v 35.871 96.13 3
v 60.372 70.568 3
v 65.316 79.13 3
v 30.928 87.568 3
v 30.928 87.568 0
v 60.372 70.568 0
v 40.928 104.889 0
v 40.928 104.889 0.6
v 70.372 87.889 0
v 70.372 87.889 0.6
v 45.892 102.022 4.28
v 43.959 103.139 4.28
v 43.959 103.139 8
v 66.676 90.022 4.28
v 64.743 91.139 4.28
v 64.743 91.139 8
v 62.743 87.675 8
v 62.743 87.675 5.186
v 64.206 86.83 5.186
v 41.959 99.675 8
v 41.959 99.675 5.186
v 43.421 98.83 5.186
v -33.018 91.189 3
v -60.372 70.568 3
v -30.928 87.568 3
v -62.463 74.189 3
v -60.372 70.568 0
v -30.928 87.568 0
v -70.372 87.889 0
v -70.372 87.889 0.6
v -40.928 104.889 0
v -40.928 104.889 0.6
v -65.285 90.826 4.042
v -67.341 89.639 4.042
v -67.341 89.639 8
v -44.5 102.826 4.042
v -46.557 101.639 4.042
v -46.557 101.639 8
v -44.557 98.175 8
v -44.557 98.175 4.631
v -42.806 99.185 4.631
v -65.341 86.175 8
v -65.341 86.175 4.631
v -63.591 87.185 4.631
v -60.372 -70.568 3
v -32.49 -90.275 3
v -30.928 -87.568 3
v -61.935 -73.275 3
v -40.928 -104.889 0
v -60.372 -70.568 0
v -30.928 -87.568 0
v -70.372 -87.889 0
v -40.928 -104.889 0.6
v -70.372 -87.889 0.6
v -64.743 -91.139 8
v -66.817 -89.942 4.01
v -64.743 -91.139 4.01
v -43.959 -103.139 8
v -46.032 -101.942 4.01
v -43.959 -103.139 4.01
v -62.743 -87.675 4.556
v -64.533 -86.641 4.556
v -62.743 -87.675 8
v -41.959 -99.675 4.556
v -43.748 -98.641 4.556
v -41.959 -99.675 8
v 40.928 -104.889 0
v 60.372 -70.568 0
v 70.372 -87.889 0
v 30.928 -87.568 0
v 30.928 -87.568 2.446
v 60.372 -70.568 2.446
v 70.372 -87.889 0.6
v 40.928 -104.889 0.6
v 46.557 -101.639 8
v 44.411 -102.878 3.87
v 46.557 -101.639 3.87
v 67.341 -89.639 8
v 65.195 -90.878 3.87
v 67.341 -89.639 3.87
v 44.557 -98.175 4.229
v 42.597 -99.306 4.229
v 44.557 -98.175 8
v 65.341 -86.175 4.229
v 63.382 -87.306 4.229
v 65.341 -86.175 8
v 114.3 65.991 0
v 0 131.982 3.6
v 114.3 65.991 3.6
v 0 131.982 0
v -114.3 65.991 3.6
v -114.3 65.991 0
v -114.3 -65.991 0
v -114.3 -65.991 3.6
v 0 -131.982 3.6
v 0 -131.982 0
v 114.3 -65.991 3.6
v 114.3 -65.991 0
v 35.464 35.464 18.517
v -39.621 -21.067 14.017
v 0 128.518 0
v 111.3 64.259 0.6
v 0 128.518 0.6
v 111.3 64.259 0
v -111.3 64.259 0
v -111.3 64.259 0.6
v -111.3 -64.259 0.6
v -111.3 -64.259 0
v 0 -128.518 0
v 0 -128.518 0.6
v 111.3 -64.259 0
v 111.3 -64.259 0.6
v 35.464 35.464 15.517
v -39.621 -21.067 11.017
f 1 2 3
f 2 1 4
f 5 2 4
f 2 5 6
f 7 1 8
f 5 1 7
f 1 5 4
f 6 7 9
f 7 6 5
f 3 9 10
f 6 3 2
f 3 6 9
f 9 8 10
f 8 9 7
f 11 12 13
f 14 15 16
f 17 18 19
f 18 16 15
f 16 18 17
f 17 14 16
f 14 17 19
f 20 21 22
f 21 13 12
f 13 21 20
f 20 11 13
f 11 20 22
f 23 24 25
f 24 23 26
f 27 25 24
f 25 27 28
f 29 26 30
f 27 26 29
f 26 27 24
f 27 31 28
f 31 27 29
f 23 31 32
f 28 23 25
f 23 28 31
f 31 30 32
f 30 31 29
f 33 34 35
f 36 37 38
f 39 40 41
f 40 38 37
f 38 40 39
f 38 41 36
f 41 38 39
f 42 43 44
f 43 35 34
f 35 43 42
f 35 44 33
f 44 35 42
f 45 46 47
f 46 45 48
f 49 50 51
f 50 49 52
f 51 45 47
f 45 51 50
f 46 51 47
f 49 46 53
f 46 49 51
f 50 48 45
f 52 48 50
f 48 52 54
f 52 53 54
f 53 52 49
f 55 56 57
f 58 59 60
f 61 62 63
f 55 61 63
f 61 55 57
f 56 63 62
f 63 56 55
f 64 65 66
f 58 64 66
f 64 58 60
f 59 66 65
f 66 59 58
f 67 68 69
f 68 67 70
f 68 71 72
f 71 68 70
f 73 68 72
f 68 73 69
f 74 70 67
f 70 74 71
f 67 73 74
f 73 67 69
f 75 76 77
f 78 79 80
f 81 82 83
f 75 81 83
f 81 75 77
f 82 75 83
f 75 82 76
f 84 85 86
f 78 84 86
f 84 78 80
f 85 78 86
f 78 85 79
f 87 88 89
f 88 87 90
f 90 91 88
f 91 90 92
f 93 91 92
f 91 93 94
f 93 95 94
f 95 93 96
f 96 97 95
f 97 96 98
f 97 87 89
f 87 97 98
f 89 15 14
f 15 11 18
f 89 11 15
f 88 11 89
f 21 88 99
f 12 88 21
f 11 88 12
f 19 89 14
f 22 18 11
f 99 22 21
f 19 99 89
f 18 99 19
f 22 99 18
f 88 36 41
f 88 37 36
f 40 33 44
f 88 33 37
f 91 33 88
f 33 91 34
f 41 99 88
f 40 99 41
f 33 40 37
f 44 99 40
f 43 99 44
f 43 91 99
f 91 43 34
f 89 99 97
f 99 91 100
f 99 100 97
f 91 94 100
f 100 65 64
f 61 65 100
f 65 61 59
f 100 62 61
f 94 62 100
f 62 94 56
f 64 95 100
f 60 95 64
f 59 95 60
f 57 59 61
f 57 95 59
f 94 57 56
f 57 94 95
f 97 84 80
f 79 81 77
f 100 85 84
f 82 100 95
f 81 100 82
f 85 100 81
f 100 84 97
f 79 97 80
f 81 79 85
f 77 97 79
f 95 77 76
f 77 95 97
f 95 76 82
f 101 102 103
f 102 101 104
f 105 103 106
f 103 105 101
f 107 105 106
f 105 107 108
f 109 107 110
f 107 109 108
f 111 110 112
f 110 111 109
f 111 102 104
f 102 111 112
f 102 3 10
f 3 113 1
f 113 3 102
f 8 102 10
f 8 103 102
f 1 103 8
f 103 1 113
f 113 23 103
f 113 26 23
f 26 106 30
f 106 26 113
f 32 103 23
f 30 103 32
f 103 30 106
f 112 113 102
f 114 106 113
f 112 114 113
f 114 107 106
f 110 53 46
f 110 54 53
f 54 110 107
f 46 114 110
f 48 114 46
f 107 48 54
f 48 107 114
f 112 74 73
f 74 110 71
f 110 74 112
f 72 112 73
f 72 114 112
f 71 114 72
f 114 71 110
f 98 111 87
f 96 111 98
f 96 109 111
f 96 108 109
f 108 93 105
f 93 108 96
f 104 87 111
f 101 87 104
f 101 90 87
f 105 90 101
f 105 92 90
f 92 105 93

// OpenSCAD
/*
    parametric_faceted_hex_wall_tile_mount_v21_master_thickness.scad
    ------------------------------------------------------------
    Improved asymmetric low-poly hex wall tile.

    Major v21 changes
    -----------------
    1. ONE master thickness control now drives the whole part:
       master_thickness_mm

       It controls:
       - faceted front shell thickness
       - perimeter wall thickness
       - mounting-tab thickness

       Optional multipliers allow advanced tuning without hiding the
       master control.

    2. Thicker shells now work automatically.
       The effective edge height is automatically raised when required
       so shell_thickness_mm is never blocked by a too-small edge height.

    3. Mounting pads cannot protrude outside the hexagon.
       Pads are intersected with a smaller inset hex footprint.

    4. Stronger default mounting geometry.
       - 3.0 mm pad thickness
       - 4.0 mm shell overlap
       - 3.0 mm edge inset
       - optional reinforcing ribs

    5. Open back remains truly open.
       There is no rear floor across the middle.

    Recommended use
    ---------------
    For a 9-inch decorative wall tile printed vertically:

        master_thickness_mm        = 3.0;
        front_shell_multiplier      = 1.0;
        perimeter_multiplier        = 1.0;
        mount_pad_multiplier        = 1.0;
        mount_pad_overlap_mm        = 4.0;
        mount_pad_edge_inset_mm     = 3.0;
        add_mount_ribs              = true;

    Export
    ------
    F6 Render
    File -> Export -> Export as STL
*/


// =============================================================================
// CUSTOMIZER PARAMETERS
// =============================================================================


/* [Tile Size] */

// Which dimension tile_size represents.
size_reference = "flat_to_flat";     // [flat_to_flat, across_corners]

// Units for tile_size.
size_units = "mm";                   // [mm, in]

// Examples:
// 152.4 = 6"
// 203.2 = 8"
// 228.6 = 9"
// 254.0 = 10"
tile_size = 228.6;

// Rotate finished tile around Z.
tile_rotation_deg = 0;


/* [MASTER THICKNESS] */

// MASTER MATERIAL THICKNESS.
//
// THIS is the main control to use if you want the whole printed part
// physically thicker / stronger.
//
// It directly drives:
//   - faceted front shell thickness
//   - perimeter wall thickness
//   - mounting pad thickness
//
// Recommended:
//   1.6 = light
//   2.0 = medium
//   2.5 = strong
//   3.0 = very strong / recommended for a robust wall tile
//   3.5 = heavy duty
//
master_thickness_mm = 3.0;

// Optional multipliers.
//
// Leave these at 1.0 unless you deliberately want one area stronger
// than the master value.
//
// Example:
// perimeter_multiplier = 1.20 makes a 3.0 mm master produce a
// 3.6 mm perimeter.
front_shell_multiplier = 1.0;
perimeter_multiplier   = 1.0;
mount_pad_multiplier   = 1.0;

// Derived thicknesses are calculated later from the master control.


/* [Front Relief] */

// proportional = scales with tile size
// absolute     = exact millimeter heights below
relief_height_mode = "proportional";    // [proportional, absolute]

// Overall relief multiplier.
relief_scale = 1.0;

// Main peak height relative to flat-to-flat size.
peak_height_ratio = 0.081;

// Ridge height relative to peak.
ridge_to_peak_ratio = 0.757;

// Requested outer edge height relative to peak.
//
// IMPORTANT:
// v21 automatically raises edge height if necessary to fit the selected
// front shell thickness. You normally do NOT need to change this anymore.
edge_to_peak_ratio = 0.097;

// Absolute values, used only in absolute mode.
peak_height_mm  = 18.5;
ridge_height_mm = 14.0;
edge_height_mm  = 1.8;

// Minimum empty clearance between the inner roof and Z=0 at the perimeter.
//
// v20 uses:
// effective_edge_height >= front_shell_thickness_mm + edge_clearance_mm
edge_clearance_mm = 0.60;


/* [Facet Layout] */

// Direction of main peak, CCW from +X.
peak_angle_deg = 45;

// Peak distance from center as a fraction of circumradius.
peak_radius_ratio = 0.38;

// Direction of secondary ridge.
ridge_angle_deg = 208;

// Ridge radial position.
ridge_radius_ratio = 0.34;


/* [Wall Mounting] */

// Enable mounting pads.
add_mount_pads = true;

// Width of each pad parallel to the corresponding hex side.
mount_pad_width_mm = 34.0;

// Radial depth of each pad.
mount_pad_depth_mm = 24.0;

// Mounting-tab thickness is now driven by master_thickness_mm.
// Use mount_pad_multiplier above only if the tabs need to be thicker
// or thinner than the rest of the tile.

// How far the pad reaches beneath the inner perimeter shell.
//
// More overlap creates a stronger pad-to-rim union.
mount_pad_overlap_mm = 4.0;

// Pull the ENTIRE usable pad footprint inward from the outside hex edge.
//
// Pads are clipped against this inset hex, so they cannot protrude outside.
mount_pad_edge_inset_mm = 3.0;

// Directions of mounting pads.
mount_pad_angles = [60, 120, 240, 300];


/* [Mount Reinforcement] */

// Add small triangular reinforcing ribs where pads meet the perimeter.
//
// Recommended ON for vertical printing.
add_mount_ribs = true;

// Rib thickness across the pad.
mount_rib_width_mm = 3.0;

// Rib height into the cavity.
mount_rib_height_mm = 5.0;

// Rib radial depth.
mount_rib_depth_mm = 8.0;


/* [Optional Screw Holes] */

add_pad_screw_holes = false;

// 3.5 ~= #6
// 4.5 ~= #8
pad_screw_hole_diameter_mm = 4.5;


/* [Advanced] */

// Polyhedron preview hint.
polyhedron_convexity = 12;

// Cylinder quality for screw holes.
screw_hole_fn = 40;


// =============================================================================
// DERIVED MATERIAL THICKNESSES
// =============================================================================
//
// These are the ACTUAL thicknesses used by the model.
//

front_shell_thickness_mm =
    master_thickness_mm * front_shell_multiplier;

perimeter_wall_thickness_mm =
    master_thickness_mm * perimeter_multiplier;

mount_pad_thickness_mm =
    master_thickness_mm * mount_pad_multiplier;


// =============================================================================
// DERIVED TILE DIMENSIONS
// =============================================================================

_tile_size_mm =
    size_units == "in"
        ? tile_size * 25.4
        : tile_size;

tile_flat_to_flat =
    size_reference == "flat_to_flat"
        ? _tile_size_mm
        : _tile_size_mm * cos(30);

tile_across_corners =
    tile_flat_to_flat / cos(30);

outer_apothem =
    tile_flat_to_flat / 2;

r_outer =
    outer_apothem / cos(30);

inner_apothem =
    outer_apothem - perimeter_wall_thickness_mm;

r_inner =
    inner_apothem / cos(30);

inner_flat_length =
    2 * inner_apothem * tan(30);

hex_side_length =
    2 * r_outer * sin(30);


// =============================================================================
// DERIVED RELIEF HEIGHTS
// =============================================================================

_peak_unscaled =
    relief_height_mode == "proportional"
        ? tile_flat_to_flat * peak_height_ratio
        : peak_height_mm;

_ridge_unscaled =
    relief_height_mode == "proportional"
        ? _peak_unscaled * ridge_to_peak_ratio
        : ridge_height_mm;

_requested_edge_unscaled =
    relief_height_mode == "proportional"
        ? _peak_unscaled * edge_to_peak_ratio
        : edge_height_mm;

peak_height =
    _peak_unscaled * relief_scale;

ridge_height =
    _ridge_unscaled * relief_scale;

requested_edge_height =
    _requested_edge_unscaled * relief_scale;

// AUTO-FIX:
// Guarantee enough vertical room for the chosen front shell thickness.
minimum_edge_height =
    front_shell_thickness_mm + edge_clearance_mm;

edge_height =
    max(
        requested_edge_height,
        minimum_edge_height
    );


// =============================================================================
// DERIVED MOUNTING GEOMETRY
// =============================================================================

// Desired outer edge before clipping.
//
// This allows the pad to overlap the inner wall structurally.
mount_pad_desired_outer_r =
    inner_apothem + mount_pad_overlap_mm;

mount_pad_inner_r =
    mount_pad_desired_outer_r - mount_pad_depth_mm;

mount_pad_center_r =
    mount_pad_desired_outer_r - mount_pad_depth_mm / 2;

// Smaller hex used as a hard clipping boundary.
//
// Any mount geometry outside this boundary is removed automatically.
mount_clip_apothem =
    outer_apothem - mount_pad_edge_inset_mm;

mount_clip_radius =
    mount_clip_apothem / cos(30);


// =============================================================================
// VALIDATION
// =============================================================================

assert(
    tile_flat_to_flat > 0,
    "tile_size must produce a positive tile dimension."
);

assert(
    master_thickness_mm > 0,
    "master_thickness_mm must be greater than zero."
);

assert(
    front_shell_multiplier > 0 &&
    perimeter_multiplier > 0 &&
    mount_pad_multiplier > 0,
    "All thickness multipliers must be greater than zero."
);

assert(
    front_shell_thickness_mm > 0,
    "front_shell_thickness_mm must be greater than zero."
);

assert(
    perimeter_wall_thickness_mm > 0,
    "perimeter_wall_thickness_mm must be greater than zero."
);

assert(
    perimeter_wall_thickness_mm < outer_apothem,
    "perimeter_wall_thickness_mm is too large for this tile."
);

assert(
    inner_apothem > 0,
    "The selected perimeter wall leaves no hollow interior."
);

assert(
    edge_height > front_shell_thickness_mm,
    "Internal error: edge_height must exceed front_shell_thickness_mm."
);

assert(
    ridge_height > edge_height,
    "ridge_height must remain greater than the effective edge height."
);

assert(
    peak_height > ridge_height,
    "peak_height must remain greater than ridge_height."
);

assert(
    peak_radius_ratio > 0 && peak_radius_ratio < 0.90,
    "peak_radius_ratio must be between 0 and 0.90."
);

assert(
    ridge_radius_ratio > 0 && ridge_radius_ratio < 0.90,
    "ridge_radius_ratio must be between 0 and 0.90."
);

assert(
    mount_pad_width_mm > 0,
    "mount_pad_width_mm must be greater than zero."
);

assert(
    mount_pad_depth_mm > 0,
    "mount_pad_depth_mm must be greater than zero."
);

assert(
    mount_pad_thickness_mm > 0,
    "mount_pad_thickness_mm must be greater than zero."
);

assert(
    mount_pad_overlap_mm >= 0,
    "mount_pad_overlap_mm cannot be negative."
);

assert(
    mount_pad_edge_inset_mm >= 0,
    "mount_pad_edge_inset_mm cannot be negative."
);

assert(
    mount_clip_apothem > 0,
    "mount_pad_edge_inset_mm is too large."
);

assert(
    mount_pad_inner_r > 0,
    "mount_pad_depth_mm is too large and reaches/passes the tile center."
);

assert(
    !add_pad_screw_holes ||
    pad_screw_hole_diameter_mm < mount_pad_width_mm * 0.75,
    "pad_screw_hole_diameter_mm is too large for the mounting pad."
);

assert(
    !add_mount_ribs ||
    mount_rib_height_mm > 0,
    "mount_rib_height_mm must be greater than zero."
);


// =============================================================================
// DIAGNOSTIC OUTPUT
// =============================================================================

echo("====================================================");
echo("FACETED HEX WALL TILE v21");
echo("====================================================");

echo(str("flat-to-flat             : ", tile_flat_to_flat, " mm"));
echo(str("across-corners           : ", tile_across_corners, " mm"));
echo(str("hex side length          : ", hex_side_length, " mm"));

echo(str("MASTER thickness         : ", master_thickness_mm, " mm"));
echo(str("actual front shell       : ", front_shell_thickness_mm, " mm"));
echo(str("actual perimeter wall    : ", perimeter_wall_thickness_mm, " mm"));
echo(str("actual mount pad         : ", mount_pad_thickness_mm, " mm"));
echo(str("perimeter wall thickness : ", perimeter_wall_thickness_mm, " mm"));

echo(str("requested edge height    : ", requested_edge_height, " mm"));
echo(str("minimum edge height      : ", minimum_edge_height, " mm"));
echo(str("EFFECTIVE edge height    : ", edge_height, " mm"));

echo(str("ridge height             : ", ridge_height, " mm"));
echo(str("peak height              : ", peak_height, " mm"));

echo(str("mount pad width          : ", mount_pad_width_mm, " mm"));
echo(str("mount pad depth          : ", mount_pad_depth_mm, " mm"));
echo(str("mount pad thickness      : ", mount_pad_thickness_mm, " mm"));
echo(str("mount pad overlap        : ", mount_pad_overlap_mm, " mm"));
echo(str("mount edge inset         : ", mount_pad_edge_inset_mm, " mm"));

echo(str("mount clip apothem       : ", mount_clip_apothem, " mm"));

if (edge_height > requested_edge_height)
    echo(
        str(
            "AUTO EDGE FIX ACTIVE: edge raised from ",
            requested_edge_height,
            " mm to ",
            edge_height,
            " mm so a ",
            front_shell_thickness_mm,
            " mm front shell fits safely."
        )
    );

echo("====================================================");


// =============================================================================
// HELPERS
// =============================================================================

function polar(angle_deg, radius) =
    [
        radius * cos(angle_deg),
        radius * sin(angle_deg)
    ];

function hex_vertex(i, radius) =
    [
        radius * cos(30 + i * 60),
        radius * sin(30 + i * 60)
    ];


// =============================================================================
// FRONT RELIEF CONTROL POINTS
// =============================================================================

P_xy =
    polar(
        peak_angle_deg,
        r_outer * peak_radius_ratio
    );

Q_xy =
    polar(
        ridge_angle_deg,
        r_outer * ridge_radius_ratio
    );


// =============================================================================
// SHELL VERTICES
// =============================================================================

points =
    concat(

        // 0..5 : outer rear perimeter
        [
            for (i = [0 : 5])
                let(p = hex_vertex(i, r_outer))
                [p[0], p[1], 0]
        ],

        // 6..11 : outer front perimeter
        [
            for (i = [0 : 5])
                let(p = hex_vertex(i, r_outer))
                [p[0], p[1], edge_height]
        ],

        // 12..13 : outer peak / ridge
        [
            [P_xy[0], P_xy[1], peak_height],
            [Q_xy[0], Q_xy[1], ridge_height]
        ],

        // 14..19 : inner rear perimeter
        [
            for (i = [0 : 5])
                let(p = hex_vertex(i, r_inner))
                [p[0], p[1], 0]
        ],

        // 20..25 : inner front perimeter
        [
            for (i = [0 : 5])
                let(p = hex_vertex(i, r_inner))
                [p[0], p[1], edge_height - front_shell_thickness_mm]
        ],

        // 26..27 : inner peak / ridge
        [
            [P_xy[0], P_xy[1], peak_height - front_shell_thickness_mm],
            [Q_xy[0], Q_xy[1], ridge_height - front_shell_thickness_mm]
        ]
    );


// =============================================================================
// SHELL FACES
// =============================================================================

outer_roof_faces = [
    [6, 7, 12],
    [7, 8, 12],
    [6, 12, 11],

    [8, 13, 12],
    [11, 12, 13],

    [8, 9, 13],
    [9, 10, 13],
    [10, 11, 13]
];

inner_roof_faces = [
    [26, 21, 20],
    [26, 22, 21],
    [25, 26, 20],

    [26, 27, 22],
    [27, 26, 25],

    [27, 23, 22],
    [27, 24, 23],
    [27, 25, 24]
];

faces =
    concat(

        // Outer vertical perimeter
        [
            for (i = [0 : 5])
                [
                    i,
                    (i + 1) % 6,
                    6 + (i + 1) % 6,
                    6 + i
                ]
        ],

        outer_roof_faces,

        // Inner vertical perimeter
        [
            for (i = [0 : 5])
                [
                    14 + i,
                    20 + i,
                    20 + (i + 1) % 6,
                    14 + (i + 1) % 6
                ]
        ],

        inner_roof_faces,

        // Narrow rear perimeter ring only.
        // Center remains open.
        [
            for (i = [0 : 5])
                [
                    i,
                    14 + i,
                    14 + (i + 1) % 6,
                    (i + 1) % 6
                ]
        ]
    );


// =============================================================================
// TILE SHELL
// =============================================================================

module tile_shell() {
    polyhedron(
        points = points,
        faces = faces,
        convexity = polyhedron_convexity
    );
}


// =============================================================================
// HEX FOOTPRINT USED TO CLIP MOUNTING TABS
// =============================================================================
//
// This is intentionally smaller than the visible outer hexagon.
// Therefore mount pads/ribs cannot stick out past the visible perimeter.
//

module mount_clip_volume(height_mm) {
    linear_extrude(height = height_mm)
        polygon(
            points = [
                for (i = [0 : 5])
                    hex_vertex(i, mount_clip_radius)
            ]
        );
}


// =============================================================================
// RAW MOUNT PAD
// =============================================================================

module raw_mount_pad(angle_deg) {
    rotate([0, 0, angle_deg])
        translate(
            [
                mount_pad_inner_r,
                -mount_pad_width_mm / 2,
                0
            ]
        )
            cube(
                [
                    mount_pad_depth_mm,
                    mount_pad_width_mm,
                    mount_pad_thickness_mm
                ]
            );
}


// =============================================================================
// CLIPPED MOUNT PAD
// =============================================================================

module mount_pad(angle_deg) {
    intersection() {
        raw_mount_pad(angle_deg);

        mount_clip_volume(
            mount_pad_thickness_mm + 0.01
        );
    }
}


// =============================================================================
// OPTIONAL REINFORCING RIBS
// =============================================================================
//
// Two ribs are placed near the left/right sides of each mounting pad.
//
// They rise into the cavity and help resist bending at the pad-to-shell joint.
//

module raw_mount_ribs(angle_deg) {

    rib_center_r =
        mount_pad_desired_outer_r
        - mount_rib_depth_mm / 2;

    rib_side_offset =
        max(
            0,
            mount_pad_width_mm / 2
            - mount_rib_width_mm
            - 2
        );

    rotate([0, 0, angle_deg]) {

        for (side = [-1, 1]) {

            translate(
                [
                    rib_center_r - mount_rib_depth_mm / 2,
                    side * rib_side_offset - mount_rib_width_mm / 2,
                    mount_pad_thickness_mm
                ]
            )

            rotate([90, 0, 90])

            linear_extrude(height = mount_rib_depth_mm)

            polygon(
                points = [
                    [0, 0],
                    [mount_rib_width_mm, 0],
                    [mount_rib_width_mm, mount_rib_height_mm],
                    [0, 0]
                ]
            );
        }
    }
}


module mount_ribs(angle_deg) {
    intersection() {

        raw_mount_ribs(angle_deg);

        mount_clip_volume(
            mount_pad_thickness_mm
            + mount_rib_height_mm
            + 0.1
        );
    }
}


// =============================================================================
// OPTIONAL SCREW HOLE
// =============================================================================

module pad_screw_hole(angle_deg) {

    rotate([0, 0, angle_deg])

        translate(
            [
                mount_pad_center_r,
                0,
                -1
            ]
        )

            cylinder(
                d = pad_screw_hole_diameter_mm,
                h =
                    mount_pad_thickness_mm
                    + mount_rib_height_mm
                    + 2,
                $fn = screw_hole_fn
            );
}


// =============================================================================
// COMPLETE MODEL
// =============================================================================

module model() {

    rotate([0, 0, tile_rotation_deg]) {

        difference() {

            union() {

                tile_shell();

                if (add_mount_pads) {

                    for (a = mount_pad_angles) {

                        mount_pad(a);

                        if (add_mount_ribs)
                            mount_ribs(a);
                    }
                }
            }

            if (
                add_mount_pads &&
                add_pad_screw_holes
            ) {

                for (a = mount_pad_angles)
                    pad_screw_hole(a);
            }
        }
    }
}


// =============================================================================
// OUTPUT
// =============================================================================

model();
